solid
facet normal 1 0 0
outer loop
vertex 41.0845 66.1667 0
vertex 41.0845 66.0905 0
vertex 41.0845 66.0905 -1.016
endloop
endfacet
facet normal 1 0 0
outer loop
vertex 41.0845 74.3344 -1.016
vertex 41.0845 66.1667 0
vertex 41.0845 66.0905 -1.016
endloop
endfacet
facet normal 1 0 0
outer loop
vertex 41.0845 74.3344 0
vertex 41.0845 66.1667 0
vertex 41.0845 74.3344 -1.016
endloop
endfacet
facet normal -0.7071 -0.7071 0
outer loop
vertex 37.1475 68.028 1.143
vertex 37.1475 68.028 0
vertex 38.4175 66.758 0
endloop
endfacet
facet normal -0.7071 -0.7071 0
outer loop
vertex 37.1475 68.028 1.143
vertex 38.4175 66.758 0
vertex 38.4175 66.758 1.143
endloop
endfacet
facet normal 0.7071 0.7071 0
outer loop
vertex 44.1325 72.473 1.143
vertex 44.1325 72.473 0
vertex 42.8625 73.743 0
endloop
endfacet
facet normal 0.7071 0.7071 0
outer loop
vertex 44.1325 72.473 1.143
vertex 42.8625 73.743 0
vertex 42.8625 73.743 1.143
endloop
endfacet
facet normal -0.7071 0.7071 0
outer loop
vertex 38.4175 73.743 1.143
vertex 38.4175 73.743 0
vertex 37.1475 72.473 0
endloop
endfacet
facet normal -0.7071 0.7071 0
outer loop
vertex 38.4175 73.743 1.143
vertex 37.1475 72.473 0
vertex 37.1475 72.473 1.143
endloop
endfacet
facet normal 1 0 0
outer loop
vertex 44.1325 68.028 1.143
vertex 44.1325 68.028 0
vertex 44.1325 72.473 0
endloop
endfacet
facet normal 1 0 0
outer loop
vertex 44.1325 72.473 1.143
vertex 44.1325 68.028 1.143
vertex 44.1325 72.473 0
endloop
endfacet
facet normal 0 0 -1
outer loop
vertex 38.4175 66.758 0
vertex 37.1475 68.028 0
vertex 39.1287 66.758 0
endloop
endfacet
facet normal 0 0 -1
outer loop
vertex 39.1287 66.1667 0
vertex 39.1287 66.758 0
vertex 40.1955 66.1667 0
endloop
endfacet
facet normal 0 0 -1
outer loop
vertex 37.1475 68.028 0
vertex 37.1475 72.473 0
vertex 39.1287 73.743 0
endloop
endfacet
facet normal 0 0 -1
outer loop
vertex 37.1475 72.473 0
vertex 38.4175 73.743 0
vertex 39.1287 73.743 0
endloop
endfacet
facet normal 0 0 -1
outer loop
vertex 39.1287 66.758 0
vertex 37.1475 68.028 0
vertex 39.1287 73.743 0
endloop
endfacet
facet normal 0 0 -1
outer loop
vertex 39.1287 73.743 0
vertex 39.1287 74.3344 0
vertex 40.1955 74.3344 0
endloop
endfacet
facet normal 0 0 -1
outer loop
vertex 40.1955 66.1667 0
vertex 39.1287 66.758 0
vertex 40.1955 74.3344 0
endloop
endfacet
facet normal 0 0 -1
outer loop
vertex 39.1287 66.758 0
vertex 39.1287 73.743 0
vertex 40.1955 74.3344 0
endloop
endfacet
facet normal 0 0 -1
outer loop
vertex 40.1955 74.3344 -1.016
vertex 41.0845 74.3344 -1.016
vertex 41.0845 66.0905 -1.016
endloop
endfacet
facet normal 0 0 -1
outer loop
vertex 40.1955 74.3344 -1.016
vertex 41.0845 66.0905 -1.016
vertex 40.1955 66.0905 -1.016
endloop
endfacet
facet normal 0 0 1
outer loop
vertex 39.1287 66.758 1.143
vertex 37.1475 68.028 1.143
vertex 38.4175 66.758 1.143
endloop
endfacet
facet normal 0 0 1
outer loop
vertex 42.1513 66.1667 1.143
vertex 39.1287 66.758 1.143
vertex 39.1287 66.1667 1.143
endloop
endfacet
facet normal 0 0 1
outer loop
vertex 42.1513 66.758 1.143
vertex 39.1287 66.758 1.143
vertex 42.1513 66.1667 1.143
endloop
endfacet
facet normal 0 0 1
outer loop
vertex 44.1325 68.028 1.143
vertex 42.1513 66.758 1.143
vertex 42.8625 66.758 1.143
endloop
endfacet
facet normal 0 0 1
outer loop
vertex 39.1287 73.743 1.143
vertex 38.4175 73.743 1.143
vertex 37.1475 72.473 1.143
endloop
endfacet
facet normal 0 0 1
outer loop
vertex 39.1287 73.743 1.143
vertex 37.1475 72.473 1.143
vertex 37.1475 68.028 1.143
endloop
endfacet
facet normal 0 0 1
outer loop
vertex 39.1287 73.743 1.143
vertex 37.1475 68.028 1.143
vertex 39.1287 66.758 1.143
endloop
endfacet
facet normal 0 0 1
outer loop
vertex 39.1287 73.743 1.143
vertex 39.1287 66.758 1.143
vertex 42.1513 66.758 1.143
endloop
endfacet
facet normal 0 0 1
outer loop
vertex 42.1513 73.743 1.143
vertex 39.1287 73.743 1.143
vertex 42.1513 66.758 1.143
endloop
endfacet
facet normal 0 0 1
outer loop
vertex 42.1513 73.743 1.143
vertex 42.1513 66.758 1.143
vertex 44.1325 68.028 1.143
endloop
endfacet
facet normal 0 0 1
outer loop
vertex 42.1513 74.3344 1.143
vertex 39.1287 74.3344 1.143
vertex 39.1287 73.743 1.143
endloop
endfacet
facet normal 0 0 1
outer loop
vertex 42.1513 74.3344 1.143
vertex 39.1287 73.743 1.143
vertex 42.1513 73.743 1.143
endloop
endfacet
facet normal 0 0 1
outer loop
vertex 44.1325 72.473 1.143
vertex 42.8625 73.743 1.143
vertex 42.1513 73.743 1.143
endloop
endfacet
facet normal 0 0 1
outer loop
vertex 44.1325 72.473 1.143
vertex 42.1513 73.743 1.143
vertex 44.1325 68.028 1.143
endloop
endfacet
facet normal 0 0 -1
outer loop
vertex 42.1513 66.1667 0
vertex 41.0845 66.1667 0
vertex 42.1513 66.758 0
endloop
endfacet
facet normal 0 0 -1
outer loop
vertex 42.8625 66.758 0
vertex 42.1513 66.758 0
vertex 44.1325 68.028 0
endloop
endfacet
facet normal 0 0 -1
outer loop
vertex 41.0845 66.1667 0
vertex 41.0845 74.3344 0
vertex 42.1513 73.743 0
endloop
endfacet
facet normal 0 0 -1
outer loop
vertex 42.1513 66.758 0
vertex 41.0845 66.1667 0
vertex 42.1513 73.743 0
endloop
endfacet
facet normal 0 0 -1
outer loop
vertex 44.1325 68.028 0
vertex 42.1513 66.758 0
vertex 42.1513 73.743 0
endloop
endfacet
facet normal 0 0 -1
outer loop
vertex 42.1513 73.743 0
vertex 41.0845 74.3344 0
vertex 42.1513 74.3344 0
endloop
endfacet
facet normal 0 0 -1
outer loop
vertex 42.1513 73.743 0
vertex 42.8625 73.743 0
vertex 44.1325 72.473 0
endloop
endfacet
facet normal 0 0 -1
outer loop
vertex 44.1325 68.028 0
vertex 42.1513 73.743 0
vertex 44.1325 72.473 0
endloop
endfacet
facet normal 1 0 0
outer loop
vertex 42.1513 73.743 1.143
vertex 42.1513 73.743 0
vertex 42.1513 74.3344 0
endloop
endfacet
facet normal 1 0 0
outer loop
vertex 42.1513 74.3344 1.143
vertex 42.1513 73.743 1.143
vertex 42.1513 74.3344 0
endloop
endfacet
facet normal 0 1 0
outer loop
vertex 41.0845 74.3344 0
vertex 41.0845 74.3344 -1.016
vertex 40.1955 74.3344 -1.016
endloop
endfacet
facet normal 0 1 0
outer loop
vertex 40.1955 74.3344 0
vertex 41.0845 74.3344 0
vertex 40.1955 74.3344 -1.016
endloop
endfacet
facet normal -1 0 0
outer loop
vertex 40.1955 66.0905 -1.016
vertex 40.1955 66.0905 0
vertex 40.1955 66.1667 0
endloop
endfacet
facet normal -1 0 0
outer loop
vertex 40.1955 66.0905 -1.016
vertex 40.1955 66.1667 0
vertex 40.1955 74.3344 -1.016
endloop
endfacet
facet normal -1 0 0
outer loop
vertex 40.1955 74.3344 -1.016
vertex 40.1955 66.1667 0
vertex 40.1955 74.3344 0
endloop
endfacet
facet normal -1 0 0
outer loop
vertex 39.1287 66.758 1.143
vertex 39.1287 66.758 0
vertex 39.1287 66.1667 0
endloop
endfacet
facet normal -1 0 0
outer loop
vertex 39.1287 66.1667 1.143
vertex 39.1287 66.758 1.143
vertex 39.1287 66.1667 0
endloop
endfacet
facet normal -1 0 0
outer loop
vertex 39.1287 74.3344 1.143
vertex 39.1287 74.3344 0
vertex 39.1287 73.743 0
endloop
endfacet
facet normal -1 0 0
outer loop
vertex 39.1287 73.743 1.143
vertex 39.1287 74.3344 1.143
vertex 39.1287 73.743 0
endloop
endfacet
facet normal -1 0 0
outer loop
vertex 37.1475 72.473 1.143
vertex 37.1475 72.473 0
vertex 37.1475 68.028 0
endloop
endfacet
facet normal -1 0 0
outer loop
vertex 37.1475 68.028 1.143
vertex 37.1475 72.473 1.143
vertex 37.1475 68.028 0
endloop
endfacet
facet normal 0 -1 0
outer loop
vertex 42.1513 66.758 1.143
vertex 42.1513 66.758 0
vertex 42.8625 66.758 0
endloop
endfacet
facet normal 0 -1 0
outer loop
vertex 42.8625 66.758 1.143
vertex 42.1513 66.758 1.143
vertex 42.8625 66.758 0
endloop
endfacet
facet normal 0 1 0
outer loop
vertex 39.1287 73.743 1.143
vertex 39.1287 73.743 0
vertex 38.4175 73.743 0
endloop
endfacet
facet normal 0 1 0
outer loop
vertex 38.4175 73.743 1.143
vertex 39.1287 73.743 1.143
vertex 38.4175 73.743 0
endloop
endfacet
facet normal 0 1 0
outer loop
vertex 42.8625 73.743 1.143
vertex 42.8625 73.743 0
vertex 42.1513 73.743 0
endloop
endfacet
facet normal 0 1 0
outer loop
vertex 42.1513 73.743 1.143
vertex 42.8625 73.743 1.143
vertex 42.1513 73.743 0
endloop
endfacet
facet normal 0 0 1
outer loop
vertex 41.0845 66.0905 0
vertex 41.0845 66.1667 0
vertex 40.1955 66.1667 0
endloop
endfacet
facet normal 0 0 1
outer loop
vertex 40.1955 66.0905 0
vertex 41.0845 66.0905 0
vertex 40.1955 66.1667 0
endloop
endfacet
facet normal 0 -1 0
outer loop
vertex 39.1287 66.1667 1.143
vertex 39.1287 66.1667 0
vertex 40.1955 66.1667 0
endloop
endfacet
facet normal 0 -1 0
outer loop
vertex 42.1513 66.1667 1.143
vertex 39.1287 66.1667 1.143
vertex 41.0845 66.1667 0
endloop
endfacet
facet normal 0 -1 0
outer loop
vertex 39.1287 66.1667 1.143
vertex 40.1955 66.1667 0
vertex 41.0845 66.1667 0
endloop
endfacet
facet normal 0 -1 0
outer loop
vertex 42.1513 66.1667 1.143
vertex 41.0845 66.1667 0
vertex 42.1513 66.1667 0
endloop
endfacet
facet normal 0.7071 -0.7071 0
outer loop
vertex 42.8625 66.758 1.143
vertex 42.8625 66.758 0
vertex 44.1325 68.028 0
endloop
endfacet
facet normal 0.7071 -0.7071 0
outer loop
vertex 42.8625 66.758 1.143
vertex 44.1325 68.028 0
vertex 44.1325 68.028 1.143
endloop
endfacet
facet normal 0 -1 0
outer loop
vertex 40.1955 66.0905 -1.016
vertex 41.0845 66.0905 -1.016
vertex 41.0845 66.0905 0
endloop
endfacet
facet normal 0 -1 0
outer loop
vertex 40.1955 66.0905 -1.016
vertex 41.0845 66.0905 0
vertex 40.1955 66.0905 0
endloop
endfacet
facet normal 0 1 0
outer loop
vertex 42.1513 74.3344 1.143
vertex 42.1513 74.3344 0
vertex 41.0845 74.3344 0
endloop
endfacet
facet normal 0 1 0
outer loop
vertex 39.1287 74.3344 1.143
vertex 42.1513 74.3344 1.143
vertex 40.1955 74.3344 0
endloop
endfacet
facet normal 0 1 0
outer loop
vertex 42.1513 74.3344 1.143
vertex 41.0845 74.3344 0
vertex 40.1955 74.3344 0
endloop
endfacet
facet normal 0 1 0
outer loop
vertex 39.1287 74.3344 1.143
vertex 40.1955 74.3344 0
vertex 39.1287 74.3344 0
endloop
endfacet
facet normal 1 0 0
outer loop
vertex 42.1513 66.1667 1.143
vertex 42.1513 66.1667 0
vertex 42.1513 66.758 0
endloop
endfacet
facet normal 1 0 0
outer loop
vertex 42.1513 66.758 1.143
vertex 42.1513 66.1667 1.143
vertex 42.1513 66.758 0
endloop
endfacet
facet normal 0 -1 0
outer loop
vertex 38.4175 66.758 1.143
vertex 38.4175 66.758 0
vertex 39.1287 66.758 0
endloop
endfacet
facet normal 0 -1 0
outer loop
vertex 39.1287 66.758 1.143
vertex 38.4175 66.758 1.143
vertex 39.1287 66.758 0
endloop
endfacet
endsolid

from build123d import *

# Parameters (mm, degrees)
BOSS_EXTRUDE1_DEPTH = 1.143
SKETCH2_W           = 0.889
SKETCH2_H           = 8.243996394
BOSS_EXTRUDE2_DEPTH = 1.016
CHAMFER1_SIZE       = 1.27


with BuildPart() as part:
    # Sketch1 → Boss-Extrude1 (new body)
    with BuildSketch(Plane.XY):
        Polygon((37.147499812, 66.75804972), (39.128699766, 66.758049722), (39.128699766, 66.16665148), (42.151299766, 66.166651485), (42.151299766, 66.758049727), (44.132499719, 66.758049729), (44.13249971, 73.743049637), (42.151299756, 73.743049634), (42.151299755, 74.334447876), (39.128699755, 74.334447872), (39.128699756, 73.74304963), (37.147499802, 73.743049628), align=None)
    extrude(amount=BOSS_EXTRUDE1_DEPTH)

    # Sketch2 → Boss-Extrude2 (add)
    with BuildSketch(Plane(origin=(0, 0, 0), x_dir=(-1, 0, 0), z_dir=(0, 0, -1))):
        with Locations((-40.639999755, 70.212449679)):
            Rectangle(SKETCH2_W, SKETCH2_H)
    extrude(amount=BOSS_EXTRUDE2_DEPTH)

    # Chamfer1
    chamfer1_edges = [part.edges().sort_by_distance(p)[0] for p in [
        (37.147499802, 73.743049628, 0.5715),
        (44.13249971, 73.743049637, 0.5715),
        (44.132499719, 66.758049729, 0.5715),
        (37.147499812, 66.75804972, 0.5715),
    ]]
    chamfer(chamfer1_edges, length=CHAMFER1_SIZE)


solid = part.part
